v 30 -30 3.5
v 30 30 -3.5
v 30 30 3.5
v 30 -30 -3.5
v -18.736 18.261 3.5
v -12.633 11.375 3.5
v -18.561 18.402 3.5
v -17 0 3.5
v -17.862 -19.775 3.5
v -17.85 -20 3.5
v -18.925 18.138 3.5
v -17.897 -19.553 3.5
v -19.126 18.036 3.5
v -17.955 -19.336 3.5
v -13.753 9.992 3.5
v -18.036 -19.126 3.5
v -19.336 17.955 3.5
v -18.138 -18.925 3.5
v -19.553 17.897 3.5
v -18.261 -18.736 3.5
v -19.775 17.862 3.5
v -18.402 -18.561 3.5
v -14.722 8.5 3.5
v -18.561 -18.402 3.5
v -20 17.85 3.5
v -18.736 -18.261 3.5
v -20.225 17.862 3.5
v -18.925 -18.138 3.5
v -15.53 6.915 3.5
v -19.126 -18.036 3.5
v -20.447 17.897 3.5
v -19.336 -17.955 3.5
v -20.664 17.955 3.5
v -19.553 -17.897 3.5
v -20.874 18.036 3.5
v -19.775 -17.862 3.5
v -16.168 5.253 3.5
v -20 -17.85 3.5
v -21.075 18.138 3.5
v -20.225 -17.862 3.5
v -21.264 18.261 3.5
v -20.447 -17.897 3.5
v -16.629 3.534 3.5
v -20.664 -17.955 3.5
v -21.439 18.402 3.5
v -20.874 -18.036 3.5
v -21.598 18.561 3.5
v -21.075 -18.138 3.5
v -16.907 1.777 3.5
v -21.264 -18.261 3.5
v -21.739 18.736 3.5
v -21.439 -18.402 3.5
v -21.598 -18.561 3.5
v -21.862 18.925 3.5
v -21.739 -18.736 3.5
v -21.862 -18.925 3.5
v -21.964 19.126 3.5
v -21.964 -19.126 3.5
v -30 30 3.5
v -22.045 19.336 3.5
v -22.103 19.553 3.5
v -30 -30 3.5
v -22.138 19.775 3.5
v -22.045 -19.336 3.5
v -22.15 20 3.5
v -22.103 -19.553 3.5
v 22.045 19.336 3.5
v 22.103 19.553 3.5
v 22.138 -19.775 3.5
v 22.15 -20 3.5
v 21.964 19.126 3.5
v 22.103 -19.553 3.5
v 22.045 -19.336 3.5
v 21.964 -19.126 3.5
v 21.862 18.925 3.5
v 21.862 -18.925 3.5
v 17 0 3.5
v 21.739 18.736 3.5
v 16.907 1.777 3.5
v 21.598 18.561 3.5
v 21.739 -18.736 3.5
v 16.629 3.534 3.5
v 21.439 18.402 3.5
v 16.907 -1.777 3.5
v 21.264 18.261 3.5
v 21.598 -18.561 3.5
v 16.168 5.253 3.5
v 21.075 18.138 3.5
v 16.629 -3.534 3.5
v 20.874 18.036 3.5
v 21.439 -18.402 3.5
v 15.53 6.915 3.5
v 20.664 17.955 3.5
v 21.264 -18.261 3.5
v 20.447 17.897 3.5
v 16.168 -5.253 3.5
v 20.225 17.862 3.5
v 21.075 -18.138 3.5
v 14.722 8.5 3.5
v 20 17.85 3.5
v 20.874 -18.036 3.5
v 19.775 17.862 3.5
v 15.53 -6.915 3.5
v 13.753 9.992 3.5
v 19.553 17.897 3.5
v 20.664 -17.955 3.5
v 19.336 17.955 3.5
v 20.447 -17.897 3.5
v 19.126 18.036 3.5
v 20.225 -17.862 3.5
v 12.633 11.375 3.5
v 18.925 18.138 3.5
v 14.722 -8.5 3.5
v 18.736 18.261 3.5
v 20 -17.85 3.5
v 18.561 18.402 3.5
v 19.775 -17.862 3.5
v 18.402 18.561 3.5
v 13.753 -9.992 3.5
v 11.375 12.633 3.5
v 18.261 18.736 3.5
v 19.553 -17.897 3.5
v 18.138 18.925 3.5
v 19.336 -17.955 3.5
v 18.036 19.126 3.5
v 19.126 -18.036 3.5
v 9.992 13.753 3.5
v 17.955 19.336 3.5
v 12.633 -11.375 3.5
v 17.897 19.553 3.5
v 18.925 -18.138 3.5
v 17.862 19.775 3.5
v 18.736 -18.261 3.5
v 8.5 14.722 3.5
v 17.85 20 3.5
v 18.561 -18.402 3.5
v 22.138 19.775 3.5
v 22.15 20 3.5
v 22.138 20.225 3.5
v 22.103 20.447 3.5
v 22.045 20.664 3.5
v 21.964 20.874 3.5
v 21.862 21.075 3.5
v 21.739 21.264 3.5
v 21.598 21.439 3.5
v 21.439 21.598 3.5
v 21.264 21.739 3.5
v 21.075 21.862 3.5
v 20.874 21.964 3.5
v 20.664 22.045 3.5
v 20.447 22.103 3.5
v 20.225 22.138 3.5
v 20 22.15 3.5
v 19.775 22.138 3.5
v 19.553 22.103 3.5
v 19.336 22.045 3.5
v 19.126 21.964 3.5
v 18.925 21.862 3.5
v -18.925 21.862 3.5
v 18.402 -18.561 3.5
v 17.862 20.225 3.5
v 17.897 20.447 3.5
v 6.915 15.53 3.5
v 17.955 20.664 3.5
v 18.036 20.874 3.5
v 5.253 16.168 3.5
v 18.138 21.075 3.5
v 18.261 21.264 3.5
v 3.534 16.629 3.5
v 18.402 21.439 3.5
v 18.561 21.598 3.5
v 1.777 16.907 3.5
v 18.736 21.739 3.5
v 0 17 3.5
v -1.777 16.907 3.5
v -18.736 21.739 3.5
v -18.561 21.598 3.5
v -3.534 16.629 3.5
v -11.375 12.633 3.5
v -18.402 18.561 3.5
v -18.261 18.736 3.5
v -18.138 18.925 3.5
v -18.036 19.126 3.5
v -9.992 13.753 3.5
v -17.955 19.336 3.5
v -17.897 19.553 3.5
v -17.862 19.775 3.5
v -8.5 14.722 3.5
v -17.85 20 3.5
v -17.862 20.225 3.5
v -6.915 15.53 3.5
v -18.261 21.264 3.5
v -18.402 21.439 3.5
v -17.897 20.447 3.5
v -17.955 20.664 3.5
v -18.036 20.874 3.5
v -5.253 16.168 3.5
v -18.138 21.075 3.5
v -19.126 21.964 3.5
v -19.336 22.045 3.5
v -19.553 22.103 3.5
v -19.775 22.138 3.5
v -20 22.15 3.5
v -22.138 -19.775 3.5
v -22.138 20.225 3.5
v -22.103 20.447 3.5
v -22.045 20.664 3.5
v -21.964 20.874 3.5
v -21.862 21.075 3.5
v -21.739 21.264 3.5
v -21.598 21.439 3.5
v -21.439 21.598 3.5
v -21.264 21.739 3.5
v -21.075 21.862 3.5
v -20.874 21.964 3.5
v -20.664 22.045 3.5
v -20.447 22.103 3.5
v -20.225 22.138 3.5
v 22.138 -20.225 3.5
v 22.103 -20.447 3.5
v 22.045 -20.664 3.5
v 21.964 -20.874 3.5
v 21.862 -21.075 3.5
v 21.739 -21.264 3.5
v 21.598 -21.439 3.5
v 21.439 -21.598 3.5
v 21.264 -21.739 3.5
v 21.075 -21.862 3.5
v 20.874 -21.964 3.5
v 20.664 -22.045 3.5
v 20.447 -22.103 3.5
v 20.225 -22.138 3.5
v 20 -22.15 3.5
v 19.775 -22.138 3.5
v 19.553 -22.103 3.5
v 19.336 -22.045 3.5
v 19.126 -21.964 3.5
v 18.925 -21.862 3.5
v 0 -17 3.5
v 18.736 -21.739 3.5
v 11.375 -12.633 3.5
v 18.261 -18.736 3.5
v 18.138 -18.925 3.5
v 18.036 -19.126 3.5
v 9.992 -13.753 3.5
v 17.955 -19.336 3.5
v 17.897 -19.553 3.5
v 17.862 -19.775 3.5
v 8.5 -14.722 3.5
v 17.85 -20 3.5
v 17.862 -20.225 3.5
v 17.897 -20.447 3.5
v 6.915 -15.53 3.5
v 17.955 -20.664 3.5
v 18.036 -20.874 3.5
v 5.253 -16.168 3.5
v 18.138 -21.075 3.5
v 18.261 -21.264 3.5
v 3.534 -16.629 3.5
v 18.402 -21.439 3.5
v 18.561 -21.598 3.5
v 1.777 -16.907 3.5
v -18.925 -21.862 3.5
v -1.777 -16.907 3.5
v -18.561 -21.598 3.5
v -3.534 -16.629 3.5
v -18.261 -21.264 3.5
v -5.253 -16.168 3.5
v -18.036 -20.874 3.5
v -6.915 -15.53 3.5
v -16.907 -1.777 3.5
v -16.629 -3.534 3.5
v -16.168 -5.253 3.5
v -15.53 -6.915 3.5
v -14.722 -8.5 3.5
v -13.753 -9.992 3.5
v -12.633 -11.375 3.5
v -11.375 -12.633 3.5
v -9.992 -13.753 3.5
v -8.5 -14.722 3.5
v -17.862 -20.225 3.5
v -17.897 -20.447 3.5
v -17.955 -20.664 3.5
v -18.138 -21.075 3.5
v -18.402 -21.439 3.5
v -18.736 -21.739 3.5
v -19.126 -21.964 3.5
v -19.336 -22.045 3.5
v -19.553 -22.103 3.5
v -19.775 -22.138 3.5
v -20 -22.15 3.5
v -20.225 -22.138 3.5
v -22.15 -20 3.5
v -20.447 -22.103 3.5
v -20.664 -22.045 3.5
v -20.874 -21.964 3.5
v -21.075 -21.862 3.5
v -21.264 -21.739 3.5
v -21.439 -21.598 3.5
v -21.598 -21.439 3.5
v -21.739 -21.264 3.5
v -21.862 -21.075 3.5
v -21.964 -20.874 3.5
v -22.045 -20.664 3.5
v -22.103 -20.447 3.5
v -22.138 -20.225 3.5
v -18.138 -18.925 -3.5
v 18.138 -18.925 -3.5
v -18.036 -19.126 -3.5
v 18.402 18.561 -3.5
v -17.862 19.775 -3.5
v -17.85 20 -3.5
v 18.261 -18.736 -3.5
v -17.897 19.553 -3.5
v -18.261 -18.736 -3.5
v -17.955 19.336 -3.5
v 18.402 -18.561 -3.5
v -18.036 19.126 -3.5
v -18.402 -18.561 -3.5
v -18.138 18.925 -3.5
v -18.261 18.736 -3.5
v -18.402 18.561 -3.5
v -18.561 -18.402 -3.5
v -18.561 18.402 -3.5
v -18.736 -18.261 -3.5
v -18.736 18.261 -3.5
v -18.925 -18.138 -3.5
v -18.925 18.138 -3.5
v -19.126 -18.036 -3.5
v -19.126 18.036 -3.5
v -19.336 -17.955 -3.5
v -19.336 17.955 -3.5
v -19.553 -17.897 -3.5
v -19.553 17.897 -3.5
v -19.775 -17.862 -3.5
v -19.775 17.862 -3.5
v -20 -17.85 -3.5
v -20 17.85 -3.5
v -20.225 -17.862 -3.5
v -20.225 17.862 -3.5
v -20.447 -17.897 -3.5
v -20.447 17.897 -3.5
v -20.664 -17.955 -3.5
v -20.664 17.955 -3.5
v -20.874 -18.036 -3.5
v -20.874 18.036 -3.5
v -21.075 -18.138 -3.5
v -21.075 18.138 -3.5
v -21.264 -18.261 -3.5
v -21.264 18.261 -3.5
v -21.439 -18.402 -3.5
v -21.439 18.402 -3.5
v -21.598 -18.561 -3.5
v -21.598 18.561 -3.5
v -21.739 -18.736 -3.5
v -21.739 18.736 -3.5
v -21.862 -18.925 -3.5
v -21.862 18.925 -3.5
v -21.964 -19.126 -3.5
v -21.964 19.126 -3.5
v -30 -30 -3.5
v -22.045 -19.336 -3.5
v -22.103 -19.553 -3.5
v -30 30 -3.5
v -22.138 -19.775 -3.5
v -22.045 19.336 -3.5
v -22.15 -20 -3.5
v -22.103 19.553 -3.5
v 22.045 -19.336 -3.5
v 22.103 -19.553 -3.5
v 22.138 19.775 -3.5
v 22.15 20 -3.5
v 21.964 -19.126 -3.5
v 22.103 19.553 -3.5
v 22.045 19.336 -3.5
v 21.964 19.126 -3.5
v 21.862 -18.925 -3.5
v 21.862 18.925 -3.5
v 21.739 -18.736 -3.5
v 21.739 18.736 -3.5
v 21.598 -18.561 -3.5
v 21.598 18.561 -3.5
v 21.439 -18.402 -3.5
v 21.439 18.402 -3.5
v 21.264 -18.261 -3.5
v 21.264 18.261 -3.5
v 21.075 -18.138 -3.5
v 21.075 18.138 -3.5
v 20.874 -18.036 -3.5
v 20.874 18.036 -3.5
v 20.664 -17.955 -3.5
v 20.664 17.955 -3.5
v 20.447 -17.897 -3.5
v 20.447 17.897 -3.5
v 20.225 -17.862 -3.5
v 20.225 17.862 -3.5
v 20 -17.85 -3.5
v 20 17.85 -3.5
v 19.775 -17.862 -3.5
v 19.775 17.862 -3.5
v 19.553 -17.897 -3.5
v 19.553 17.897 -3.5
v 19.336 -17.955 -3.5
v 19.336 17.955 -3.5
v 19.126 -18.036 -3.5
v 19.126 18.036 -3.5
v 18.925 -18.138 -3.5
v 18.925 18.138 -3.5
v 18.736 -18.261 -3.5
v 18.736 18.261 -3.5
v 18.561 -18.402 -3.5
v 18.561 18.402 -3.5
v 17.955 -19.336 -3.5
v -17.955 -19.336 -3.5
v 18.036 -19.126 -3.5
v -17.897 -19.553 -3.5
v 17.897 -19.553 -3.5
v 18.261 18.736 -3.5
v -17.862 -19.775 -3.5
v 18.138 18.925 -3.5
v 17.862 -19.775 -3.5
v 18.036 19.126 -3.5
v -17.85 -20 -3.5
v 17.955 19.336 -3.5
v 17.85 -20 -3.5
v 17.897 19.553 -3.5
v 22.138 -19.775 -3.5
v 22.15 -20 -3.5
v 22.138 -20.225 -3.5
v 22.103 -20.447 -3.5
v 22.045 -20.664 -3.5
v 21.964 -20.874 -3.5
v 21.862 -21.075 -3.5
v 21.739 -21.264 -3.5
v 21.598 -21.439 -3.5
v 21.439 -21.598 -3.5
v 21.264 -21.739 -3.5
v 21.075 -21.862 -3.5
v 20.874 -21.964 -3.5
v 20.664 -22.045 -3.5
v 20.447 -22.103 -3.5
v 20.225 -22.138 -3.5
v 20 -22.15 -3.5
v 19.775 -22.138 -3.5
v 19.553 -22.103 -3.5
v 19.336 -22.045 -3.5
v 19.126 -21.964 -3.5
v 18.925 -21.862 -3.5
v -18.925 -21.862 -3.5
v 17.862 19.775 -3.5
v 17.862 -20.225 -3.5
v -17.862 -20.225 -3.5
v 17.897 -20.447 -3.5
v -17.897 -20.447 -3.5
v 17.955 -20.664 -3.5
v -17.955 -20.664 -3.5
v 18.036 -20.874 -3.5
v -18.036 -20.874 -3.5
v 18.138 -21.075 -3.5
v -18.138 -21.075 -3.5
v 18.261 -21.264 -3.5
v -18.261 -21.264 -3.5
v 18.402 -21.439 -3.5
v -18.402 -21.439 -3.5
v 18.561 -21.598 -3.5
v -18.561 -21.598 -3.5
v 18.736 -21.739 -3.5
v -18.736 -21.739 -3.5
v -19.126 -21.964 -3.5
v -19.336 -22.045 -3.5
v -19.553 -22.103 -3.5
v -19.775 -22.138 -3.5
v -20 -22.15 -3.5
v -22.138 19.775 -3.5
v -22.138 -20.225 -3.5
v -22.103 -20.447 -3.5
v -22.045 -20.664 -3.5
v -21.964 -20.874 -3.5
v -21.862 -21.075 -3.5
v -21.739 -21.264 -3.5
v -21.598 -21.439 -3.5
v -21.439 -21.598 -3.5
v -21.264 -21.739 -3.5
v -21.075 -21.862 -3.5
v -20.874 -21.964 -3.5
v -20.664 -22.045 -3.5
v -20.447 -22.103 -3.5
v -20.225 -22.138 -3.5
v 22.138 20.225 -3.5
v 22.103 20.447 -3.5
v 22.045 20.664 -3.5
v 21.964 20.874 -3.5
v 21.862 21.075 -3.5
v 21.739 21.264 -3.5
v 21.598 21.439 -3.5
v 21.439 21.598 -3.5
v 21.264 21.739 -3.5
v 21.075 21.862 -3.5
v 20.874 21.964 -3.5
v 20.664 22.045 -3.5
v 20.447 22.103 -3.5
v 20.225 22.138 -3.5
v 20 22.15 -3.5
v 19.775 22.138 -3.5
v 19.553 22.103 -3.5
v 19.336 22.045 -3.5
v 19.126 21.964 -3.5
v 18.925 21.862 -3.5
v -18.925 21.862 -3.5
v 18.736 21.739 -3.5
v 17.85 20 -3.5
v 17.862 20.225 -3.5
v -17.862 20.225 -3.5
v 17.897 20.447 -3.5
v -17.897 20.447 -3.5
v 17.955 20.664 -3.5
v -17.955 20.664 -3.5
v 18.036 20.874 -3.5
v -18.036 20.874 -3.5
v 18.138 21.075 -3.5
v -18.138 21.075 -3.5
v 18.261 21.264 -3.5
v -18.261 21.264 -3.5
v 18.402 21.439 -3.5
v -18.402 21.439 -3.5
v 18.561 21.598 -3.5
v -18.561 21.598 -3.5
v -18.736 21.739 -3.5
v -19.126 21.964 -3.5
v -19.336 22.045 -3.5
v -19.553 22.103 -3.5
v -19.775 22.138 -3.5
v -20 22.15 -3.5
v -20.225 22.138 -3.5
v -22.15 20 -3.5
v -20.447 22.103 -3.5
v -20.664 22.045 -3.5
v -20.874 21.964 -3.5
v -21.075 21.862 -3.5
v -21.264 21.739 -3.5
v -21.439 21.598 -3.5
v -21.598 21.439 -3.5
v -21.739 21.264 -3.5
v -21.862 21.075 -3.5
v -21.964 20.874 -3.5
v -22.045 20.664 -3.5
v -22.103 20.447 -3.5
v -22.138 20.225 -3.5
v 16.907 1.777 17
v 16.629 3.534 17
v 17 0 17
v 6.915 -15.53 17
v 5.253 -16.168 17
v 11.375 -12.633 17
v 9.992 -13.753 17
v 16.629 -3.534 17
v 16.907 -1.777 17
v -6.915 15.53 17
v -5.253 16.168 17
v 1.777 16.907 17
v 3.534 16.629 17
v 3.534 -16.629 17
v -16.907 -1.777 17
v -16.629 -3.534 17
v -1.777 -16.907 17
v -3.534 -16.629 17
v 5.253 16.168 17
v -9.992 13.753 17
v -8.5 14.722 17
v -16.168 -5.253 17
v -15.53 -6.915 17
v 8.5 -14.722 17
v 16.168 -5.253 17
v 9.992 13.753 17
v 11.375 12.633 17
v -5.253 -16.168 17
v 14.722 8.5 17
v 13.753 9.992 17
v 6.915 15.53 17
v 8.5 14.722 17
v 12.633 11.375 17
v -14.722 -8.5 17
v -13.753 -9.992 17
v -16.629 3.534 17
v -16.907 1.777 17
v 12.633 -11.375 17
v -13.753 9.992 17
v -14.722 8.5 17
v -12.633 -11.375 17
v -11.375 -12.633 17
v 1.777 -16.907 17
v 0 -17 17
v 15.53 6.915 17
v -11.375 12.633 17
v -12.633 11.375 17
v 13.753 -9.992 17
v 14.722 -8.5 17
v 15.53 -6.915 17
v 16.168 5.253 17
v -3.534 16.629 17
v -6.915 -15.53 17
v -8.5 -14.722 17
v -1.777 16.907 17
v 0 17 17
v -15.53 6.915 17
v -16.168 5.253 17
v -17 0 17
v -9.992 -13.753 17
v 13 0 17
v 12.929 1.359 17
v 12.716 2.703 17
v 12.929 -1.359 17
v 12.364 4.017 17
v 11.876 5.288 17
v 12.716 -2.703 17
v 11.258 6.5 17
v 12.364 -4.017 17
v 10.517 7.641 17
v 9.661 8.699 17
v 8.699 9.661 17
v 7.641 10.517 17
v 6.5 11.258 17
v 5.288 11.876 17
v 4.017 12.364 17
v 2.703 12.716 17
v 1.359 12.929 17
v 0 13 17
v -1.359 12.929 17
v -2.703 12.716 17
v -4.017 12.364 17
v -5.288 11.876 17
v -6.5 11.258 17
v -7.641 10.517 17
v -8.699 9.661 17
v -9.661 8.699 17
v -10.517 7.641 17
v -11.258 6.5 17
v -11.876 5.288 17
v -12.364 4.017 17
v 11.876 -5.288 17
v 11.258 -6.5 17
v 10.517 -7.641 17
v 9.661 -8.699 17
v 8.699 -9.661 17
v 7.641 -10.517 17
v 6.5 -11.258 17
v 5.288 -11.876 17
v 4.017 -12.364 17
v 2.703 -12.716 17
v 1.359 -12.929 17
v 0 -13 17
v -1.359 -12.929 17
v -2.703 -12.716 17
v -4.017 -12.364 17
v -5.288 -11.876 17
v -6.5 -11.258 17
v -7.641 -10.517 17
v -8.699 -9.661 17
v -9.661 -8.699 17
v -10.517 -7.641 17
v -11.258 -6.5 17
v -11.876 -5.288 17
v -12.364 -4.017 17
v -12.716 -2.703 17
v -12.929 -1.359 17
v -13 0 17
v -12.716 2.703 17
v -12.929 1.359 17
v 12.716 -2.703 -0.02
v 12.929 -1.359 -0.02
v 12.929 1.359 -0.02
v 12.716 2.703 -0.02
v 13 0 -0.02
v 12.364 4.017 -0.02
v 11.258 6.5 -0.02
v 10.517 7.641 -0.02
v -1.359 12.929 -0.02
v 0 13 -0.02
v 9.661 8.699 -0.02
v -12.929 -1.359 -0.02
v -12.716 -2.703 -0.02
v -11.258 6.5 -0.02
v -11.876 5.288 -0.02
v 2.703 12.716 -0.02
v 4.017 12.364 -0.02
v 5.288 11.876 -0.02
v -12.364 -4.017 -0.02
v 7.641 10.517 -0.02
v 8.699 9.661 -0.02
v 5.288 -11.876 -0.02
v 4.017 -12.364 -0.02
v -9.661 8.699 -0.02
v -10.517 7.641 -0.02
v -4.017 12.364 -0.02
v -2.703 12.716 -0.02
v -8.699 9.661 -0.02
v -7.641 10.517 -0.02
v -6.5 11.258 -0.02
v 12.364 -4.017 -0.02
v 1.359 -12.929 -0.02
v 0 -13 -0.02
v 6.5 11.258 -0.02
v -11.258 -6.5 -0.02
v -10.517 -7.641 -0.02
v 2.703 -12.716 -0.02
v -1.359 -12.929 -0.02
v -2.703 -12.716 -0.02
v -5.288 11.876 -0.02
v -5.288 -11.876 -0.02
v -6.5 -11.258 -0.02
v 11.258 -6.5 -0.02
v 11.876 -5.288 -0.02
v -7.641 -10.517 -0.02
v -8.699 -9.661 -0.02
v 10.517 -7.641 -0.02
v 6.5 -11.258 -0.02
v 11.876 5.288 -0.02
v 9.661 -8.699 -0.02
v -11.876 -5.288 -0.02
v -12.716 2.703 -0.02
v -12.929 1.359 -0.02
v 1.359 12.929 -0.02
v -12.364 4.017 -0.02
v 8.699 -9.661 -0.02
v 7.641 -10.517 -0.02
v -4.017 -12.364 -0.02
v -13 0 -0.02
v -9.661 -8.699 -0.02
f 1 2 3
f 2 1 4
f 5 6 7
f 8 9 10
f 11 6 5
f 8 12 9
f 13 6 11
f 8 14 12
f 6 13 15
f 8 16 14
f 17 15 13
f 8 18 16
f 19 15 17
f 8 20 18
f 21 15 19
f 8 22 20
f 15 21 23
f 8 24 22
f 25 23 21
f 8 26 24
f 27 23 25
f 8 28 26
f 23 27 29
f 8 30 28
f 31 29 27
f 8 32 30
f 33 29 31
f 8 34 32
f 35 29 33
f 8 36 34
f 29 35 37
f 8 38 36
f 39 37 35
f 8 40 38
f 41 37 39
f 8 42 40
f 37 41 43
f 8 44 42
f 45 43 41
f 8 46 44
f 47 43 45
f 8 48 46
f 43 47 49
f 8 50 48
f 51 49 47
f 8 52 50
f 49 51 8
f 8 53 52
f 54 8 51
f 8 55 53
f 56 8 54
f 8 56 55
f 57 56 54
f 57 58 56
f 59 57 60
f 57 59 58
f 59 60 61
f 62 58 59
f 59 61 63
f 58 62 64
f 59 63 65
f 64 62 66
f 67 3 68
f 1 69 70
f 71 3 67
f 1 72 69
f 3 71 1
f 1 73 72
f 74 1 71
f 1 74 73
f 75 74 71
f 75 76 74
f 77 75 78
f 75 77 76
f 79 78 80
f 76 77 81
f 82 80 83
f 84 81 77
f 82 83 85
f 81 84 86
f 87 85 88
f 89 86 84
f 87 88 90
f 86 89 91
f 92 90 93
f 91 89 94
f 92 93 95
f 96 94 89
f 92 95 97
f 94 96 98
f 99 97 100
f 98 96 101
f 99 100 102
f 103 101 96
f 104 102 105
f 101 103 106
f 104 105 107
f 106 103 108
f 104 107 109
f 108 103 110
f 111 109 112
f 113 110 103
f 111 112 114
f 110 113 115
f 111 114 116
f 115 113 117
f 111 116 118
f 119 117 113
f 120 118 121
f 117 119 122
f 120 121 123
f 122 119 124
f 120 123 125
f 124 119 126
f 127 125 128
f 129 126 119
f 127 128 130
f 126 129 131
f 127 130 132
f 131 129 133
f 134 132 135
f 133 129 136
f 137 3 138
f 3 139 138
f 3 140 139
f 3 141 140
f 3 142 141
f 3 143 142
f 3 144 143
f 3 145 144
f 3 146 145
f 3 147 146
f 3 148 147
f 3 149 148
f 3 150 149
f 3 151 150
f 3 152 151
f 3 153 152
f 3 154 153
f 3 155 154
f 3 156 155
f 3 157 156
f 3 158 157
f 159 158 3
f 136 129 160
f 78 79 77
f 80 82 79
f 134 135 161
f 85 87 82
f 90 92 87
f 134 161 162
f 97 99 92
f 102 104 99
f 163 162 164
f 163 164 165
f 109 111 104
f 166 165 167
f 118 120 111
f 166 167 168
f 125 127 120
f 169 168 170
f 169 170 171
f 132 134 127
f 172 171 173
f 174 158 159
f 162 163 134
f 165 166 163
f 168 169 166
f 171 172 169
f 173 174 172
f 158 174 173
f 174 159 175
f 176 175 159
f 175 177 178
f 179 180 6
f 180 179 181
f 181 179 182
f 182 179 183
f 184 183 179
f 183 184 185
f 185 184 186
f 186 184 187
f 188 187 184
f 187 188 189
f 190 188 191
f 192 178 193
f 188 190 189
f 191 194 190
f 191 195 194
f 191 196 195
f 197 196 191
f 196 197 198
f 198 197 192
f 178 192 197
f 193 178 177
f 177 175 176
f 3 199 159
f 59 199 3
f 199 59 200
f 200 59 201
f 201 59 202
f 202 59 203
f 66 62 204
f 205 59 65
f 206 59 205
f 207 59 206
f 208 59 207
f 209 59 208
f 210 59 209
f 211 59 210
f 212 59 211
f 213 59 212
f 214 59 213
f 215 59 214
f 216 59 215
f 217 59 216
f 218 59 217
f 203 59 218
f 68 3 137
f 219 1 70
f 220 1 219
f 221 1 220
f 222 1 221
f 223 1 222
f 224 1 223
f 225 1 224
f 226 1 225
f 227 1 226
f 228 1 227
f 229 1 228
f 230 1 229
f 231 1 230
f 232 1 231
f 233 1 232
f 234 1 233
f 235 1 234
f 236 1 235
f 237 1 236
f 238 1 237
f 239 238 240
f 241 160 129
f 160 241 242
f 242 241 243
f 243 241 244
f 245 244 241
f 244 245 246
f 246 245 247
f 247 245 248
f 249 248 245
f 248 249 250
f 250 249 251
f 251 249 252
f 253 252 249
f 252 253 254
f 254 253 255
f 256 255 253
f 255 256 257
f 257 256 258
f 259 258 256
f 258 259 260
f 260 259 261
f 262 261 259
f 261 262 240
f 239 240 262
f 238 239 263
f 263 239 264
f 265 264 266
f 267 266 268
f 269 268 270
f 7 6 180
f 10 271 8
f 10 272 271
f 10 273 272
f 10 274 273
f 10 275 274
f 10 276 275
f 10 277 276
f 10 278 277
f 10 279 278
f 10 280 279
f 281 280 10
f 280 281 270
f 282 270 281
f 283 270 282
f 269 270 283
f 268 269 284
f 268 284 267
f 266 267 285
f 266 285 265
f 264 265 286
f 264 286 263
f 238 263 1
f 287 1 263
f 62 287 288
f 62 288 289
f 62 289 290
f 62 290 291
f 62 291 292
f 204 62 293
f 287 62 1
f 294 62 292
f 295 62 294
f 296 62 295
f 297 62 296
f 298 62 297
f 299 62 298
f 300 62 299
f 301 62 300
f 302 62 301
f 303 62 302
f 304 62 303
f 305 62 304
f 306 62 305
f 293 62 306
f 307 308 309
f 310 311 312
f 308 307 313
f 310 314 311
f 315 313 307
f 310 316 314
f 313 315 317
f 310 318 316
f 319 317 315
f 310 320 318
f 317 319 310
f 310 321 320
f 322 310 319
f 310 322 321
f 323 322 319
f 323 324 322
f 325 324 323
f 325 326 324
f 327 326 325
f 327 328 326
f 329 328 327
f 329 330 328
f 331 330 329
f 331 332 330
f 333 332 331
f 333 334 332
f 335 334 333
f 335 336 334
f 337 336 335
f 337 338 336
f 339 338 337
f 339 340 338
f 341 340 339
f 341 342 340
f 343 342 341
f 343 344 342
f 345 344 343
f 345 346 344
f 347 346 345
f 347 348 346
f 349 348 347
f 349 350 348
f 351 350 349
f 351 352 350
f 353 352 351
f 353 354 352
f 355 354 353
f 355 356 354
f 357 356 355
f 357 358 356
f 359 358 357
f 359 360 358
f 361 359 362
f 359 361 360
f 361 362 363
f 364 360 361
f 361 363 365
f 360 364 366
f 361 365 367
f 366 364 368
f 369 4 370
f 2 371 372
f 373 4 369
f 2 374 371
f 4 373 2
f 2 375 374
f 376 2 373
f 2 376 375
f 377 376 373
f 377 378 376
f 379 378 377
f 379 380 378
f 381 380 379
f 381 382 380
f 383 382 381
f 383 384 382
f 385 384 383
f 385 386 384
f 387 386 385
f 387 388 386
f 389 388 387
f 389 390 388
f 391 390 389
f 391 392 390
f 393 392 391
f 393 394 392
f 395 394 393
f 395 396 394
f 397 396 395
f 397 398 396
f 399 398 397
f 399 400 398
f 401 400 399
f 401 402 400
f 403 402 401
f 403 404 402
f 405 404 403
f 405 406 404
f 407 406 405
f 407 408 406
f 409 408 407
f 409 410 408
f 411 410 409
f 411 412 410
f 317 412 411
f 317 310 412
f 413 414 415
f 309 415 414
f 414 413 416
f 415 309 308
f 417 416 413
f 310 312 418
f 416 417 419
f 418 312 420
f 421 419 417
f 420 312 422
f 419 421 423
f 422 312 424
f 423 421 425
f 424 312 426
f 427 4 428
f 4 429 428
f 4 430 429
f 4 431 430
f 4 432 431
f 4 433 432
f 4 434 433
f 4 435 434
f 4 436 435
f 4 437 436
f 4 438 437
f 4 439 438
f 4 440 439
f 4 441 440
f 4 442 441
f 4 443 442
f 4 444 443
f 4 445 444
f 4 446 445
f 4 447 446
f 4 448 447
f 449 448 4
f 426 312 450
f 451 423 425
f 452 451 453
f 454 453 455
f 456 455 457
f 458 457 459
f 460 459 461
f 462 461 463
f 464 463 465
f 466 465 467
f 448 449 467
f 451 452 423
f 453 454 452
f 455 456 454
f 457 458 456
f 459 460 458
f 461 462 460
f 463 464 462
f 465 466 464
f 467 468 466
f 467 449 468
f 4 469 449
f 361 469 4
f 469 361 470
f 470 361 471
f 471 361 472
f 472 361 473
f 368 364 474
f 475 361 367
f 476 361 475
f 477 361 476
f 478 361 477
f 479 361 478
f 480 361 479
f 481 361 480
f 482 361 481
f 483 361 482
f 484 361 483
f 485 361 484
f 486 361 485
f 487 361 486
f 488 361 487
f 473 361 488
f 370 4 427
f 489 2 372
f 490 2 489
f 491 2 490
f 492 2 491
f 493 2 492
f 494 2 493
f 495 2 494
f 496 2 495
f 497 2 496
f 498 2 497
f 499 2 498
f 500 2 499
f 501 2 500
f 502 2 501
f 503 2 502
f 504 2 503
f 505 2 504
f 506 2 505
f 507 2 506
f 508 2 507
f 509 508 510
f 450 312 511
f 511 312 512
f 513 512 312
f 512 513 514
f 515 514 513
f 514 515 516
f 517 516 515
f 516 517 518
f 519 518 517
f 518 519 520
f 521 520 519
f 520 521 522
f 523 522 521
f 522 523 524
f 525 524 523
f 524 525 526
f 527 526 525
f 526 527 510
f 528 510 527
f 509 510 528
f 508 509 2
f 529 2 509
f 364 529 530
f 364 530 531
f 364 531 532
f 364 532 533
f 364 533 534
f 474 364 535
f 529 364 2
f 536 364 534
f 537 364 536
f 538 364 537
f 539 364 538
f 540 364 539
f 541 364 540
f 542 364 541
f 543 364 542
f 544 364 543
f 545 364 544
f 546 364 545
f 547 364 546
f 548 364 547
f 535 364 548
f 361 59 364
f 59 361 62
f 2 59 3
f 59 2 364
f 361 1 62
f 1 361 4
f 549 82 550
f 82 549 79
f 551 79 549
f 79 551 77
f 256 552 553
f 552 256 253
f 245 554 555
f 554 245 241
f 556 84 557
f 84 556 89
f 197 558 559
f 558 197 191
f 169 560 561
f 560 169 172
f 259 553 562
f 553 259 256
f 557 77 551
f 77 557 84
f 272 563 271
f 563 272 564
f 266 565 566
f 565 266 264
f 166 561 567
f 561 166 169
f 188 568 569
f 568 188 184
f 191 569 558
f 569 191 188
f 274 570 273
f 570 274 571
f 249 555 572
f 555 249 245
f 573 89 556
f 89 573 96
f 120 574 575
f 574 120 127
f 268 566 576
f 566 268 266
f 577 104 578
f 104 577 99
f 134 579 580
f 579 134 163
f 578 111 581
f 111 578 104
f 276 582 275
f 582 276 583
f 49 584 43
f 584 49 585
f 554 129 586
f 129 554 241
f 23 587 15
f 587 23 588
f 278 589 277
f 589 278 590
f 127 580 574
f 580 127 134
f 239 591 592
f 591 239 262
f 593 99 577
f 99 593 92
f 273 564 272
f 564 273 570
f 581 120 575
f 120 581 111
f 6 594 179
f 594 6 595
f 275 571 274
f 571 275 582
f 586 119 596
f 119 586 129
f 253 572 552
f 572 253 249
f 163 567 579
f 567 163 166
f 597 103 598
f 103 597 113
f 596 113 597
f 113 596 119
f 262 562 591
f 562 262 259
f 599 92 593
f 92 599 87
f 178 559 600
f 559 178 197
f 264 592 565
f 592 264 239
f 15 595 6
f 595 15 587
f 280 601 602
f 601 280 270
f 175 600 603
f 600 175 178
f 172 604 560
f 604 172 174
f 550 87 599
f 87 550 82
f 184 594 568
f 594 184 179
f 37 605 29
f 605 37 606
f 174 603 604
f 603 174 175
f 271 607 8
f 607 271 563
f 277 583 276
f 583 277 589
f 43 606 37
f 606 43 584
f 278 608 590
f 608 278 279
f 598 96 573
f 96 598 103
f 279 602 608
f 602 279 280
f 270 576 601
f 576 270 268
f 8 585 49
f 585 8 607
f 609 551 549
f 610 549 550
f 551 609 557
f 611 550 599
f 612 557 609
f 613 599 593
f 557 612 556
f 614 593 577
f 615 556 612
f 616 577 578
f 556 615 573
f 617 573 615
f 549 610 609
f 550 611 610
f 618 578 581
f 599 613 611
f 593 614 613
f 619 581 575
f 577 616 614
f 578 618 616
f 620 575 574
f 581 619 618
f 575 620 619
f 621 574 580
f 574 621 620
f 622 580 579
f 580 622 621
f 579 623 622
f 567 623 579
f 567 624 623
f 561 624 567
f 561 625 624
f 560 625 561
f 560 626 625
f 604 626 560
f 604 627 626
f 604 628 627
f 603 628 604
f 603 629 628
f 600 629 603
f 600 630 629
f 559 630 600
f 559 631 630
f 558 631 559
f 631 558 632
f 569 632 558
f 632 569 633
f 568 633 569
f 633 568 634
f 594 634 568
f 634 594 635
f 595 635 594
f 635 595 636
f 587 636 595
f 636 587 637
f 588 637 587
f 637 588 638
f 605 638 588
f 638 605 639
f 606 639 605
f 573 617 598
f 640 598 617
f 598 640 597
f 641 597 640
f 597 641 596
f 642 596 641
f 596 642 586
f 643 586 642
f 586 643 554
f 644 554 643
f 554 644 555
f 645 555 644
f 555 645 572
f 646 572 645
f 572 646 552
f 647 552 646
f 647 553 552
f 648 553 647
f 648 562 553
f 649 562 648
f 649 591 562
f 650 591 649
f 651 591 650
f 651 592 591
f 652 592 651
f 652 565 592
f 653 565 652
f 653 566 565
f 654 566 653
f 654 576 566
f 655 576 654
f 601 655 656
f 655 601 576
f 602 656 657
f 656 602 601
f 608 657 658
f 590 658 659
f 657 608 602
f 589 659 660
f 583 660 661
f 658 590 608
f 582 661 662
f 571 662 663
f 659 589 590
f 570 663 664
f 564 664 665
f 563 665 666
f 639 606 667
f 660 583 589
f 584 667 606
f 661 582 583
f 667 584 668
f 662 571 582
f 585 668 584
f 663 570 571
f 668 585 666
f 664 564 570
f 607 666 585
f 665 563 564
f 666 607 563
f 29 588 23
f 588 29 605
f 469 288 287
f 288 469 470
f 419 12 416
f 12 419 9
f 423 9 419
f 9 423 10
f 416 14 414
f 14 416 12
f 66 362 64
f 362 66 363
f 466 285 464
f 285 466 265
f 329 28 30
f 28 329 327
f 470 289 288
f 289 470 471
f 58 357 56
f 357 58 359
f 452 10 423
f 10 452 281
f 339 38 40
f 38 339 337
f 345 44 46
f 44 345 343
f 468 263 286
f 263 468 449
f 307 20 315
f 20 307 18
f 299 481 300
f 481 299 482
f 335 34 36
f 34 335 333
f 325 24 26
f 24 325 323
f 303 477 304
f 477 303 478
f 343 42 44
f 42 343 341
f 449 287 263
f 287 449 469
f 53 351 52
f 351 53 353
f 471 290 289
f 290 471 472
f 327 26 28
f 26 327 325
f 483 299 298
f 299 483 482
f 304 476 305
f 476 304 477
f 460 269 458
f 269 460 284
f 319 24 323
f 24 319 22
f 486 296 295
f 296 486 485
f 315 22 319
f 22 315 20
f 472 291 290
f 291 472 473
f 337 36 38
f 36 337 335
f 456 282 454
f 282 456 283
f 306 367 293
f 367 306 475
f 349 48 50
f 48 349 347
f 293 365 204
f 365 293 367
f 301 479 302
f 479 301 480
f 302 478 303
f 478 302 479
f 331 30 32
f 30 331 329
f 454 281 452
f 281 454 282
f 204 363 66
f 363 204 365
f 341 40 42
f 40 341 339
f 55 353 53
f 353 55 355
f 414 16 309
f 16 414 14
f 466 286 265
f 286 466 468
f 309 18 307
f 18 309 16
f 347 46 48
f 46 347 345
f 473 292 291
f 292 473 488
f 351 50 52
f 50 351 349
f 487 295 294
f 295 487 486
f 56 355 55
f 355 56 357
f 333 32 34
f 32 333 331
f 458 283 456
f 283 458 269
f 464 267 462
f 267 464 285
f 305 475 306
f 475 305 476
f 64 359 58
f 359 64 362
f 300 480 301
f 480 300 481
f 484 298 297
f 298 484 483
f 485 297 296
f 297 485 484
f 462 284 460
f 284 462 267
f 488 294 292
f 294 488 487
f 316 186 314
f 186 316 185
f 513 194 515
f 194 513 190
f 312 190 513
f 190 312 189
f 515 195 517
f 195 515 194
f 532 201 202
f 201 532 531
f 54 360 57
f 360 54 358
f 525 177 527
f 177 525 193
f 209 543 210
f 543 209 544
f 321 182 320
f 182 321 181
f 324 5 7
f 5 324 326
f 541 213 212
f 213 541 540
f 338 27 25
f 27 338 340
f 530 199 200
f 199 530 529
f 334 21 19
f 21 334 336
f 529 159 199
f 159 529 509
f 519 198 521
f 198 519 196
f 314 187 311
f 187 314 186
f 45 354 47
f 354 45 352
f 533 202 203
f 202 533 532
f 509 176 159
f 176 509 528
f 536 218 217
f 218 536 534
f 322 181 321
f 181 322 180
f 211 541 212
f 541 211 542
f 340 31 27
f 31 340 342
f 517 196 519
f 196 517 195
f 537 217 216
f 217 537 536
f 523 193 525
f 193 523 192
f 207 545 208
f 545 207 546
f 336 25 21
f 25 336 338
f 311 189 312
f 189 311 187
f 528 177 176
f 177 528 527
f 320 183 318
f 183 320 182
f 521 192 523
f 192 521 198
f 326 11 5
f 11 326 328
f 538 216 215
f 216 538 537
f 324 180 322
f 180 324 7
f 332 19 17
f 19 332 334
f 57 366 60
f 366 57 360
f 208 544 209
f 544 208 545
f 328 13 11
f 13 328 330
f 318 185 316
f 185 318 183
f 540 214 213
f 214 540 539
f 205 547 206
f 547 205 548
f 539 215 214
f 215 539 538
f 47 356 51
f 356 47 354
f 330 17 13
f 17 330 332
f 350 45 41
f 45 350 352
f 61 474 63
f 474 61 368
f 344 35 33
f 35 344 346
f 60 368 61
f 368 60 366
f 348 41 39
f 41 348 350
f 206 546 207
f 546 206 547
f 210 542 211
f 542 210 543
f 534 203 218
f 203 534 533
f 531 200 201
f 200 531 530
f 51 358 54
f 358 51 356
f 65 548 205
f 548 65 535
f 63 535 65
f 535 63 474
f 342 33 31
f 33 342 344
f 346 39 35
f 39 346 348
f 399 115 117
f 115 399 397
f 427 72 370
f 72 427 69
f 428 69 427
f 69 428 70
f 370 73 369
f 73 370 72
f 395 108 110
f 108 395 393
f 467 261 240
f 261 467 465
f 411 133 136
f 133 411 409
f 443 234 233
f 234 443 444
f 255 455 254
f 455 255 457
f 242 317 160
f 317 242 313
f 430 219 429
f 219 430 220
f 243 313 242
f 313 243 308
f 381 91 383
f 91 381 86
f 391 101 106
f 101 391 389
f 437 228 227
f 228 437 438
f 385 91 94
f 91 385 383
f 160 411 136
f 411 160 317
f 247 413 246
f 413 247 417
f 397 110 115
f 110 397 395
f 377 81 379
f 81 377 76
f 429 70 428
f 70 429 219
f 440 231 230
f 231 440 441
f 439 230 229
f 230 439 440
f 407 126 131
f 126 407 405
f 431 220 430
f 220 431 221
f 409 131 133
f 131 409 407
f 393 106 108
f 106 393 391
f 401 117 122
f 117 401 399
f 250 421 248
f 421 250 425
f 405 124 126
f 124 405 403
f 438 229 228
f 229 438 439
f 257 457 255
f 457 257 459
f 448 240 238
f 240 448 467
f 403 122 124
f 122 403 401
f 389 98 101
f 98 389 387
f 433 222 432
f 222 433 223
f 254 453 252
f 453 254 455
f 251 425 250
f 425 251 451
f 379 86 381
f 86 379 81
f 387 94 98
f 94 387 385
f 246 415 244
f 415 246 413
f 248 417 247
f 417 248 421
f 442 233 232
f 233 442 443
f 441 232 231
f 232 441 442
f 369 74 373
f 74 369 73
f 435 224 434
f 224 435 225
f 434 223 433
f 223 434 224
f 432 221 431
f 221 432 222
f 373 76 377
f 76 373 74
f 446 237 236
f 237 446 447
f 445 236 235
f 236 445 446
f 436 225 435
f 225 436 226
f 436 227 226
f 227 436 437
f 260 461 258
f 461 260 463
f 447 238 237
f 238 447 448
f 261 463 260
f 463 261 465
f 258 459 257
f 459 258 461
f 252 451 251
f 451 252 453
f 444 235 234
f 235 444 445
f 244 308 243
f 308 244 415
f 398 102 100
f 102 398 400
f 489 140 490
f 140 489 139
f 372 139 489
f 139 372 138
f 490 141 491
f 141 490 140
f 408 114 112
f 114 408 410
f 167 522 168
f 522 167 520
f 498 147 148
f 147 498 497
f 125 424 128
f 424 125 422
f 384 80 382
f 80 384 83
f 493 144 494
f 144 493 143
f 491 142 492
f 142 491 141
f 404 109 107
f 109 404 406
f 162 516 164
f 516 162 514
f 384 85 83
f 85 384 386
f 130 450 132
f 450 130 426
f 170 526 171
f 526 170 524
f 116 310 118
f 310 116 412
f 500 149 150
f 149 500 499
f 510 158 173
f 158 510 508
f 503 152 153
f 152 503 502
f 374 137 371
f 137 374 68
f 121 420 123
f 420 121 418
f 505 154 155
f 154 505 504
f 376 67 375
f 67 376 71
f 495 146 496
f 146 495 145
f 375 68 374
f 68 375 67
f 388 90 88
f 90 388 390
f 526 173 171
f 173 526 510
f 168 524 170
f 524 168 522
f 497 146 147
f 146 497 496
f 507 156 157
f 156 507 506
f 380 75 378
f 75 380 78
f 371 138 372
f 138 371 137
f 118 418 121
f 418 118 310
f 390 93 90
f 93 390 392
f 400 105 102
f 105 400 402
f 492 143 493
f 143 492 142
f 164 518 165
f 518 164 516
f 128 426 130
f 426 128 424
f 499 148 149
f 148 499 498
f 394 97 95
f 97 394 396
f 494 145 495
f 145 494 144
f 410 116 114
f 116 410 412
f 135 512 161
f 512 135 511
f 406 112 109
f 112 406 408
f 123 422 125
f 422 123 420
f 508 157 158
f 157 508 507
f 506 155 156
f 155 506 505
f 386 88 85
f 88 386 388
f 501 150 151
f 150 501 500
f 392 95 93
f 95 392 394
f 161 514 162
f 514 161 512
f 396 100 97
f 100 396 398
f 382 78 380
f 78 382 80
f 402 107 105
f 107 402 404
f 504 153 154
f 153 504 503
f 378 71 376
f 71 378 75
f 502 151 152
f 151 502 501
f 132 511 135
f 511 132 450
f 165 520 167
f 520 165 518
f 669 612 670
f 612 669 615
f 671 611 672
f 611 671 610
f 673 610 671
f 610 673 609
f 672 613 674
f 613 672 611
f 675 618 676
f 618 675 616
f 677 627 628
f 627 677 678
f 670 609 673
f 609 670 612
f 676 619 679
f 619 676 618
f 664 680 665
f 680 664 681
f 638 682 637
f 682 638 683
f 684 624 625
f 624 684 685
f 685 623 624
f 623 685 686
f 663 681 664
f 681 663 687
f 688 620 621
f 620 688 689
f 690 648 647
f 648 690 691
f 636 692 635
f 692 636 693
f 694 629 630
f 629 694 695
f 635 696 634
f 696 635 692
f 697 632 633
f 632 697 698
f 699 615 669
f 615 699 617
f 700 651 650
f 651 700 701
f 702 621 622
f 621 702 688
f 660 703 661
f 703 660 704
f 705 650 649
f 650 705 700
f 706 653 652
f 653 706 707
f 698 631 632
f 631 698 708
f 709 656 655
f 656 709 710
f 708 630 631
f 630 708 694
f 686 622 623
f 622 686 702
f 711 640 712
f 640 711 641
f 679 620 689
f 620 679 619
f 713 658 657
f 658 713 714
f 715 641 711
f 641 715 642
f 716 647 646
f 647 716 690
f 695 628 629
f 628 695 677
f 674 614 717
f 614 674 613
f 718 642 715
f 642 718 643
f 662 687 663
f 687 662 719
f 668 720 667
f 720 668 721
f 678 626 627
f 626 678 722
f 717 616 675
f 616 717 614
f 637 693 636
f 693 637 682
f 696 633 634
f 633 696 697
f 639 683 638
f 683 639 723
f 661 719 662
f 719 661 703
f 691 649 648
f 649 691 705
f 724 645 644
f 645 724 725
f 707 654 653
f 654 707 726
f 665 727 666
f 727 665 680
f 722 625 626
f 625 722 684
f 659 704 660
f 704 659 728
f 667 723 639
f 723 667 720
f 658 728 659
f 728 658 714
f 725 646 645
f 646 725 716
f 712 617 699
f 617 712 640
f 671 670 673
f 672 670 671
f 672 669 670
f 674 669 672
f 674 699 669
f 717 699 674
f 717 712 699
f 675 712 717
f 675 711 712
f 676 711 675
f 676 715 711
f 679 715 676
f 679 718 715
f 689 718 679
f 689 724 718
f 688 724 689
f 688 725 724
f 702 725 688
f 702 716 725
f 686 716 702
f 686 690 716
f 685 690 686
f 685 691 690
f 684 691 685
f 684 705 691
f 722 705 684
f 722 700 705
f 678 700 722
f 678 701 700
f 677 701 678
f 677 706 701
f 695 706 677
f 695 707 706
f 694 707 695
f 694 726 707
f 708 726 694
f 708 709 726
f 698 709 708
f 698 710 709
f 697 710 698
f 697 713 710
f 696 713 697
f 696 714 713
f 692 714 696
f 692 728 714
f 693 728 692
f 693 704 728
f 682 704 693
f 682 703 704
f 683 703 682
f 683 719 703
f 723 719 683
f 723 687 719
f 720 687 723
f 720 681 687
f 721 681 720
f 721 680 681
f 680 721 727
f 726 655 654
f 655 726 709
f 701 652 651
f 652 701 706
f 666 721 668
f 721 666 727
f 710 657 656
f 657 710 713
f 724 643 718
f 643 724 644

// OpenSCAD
// Flange bearing block for 26 mm bearing OD.
$fn = 60;
eps = 0.02;
bearing_d = 26;
plate_l = bearing_d + 34;
plate_t = 7;
hub_h = bearing_d / 2 + 4;
difference() {
    union() {
        cube([plate_l, plate_l, plate_t], center = true);
        cylinder(d = bearing_d + 8, h = hub_h);
    }
    translate([0, 0, -eps]) cylinder(d = bearing_d, h = hub_h + 2 * eps);
    for (x = [-plate_l / 3, plate_l / 3], y = [-plate_l / 3, plate_l / 3])
        translate([x, y, -plate_t / 2 - eps]) cylinder(d = 4.3, h = plate_t + 2 * eps);
}
